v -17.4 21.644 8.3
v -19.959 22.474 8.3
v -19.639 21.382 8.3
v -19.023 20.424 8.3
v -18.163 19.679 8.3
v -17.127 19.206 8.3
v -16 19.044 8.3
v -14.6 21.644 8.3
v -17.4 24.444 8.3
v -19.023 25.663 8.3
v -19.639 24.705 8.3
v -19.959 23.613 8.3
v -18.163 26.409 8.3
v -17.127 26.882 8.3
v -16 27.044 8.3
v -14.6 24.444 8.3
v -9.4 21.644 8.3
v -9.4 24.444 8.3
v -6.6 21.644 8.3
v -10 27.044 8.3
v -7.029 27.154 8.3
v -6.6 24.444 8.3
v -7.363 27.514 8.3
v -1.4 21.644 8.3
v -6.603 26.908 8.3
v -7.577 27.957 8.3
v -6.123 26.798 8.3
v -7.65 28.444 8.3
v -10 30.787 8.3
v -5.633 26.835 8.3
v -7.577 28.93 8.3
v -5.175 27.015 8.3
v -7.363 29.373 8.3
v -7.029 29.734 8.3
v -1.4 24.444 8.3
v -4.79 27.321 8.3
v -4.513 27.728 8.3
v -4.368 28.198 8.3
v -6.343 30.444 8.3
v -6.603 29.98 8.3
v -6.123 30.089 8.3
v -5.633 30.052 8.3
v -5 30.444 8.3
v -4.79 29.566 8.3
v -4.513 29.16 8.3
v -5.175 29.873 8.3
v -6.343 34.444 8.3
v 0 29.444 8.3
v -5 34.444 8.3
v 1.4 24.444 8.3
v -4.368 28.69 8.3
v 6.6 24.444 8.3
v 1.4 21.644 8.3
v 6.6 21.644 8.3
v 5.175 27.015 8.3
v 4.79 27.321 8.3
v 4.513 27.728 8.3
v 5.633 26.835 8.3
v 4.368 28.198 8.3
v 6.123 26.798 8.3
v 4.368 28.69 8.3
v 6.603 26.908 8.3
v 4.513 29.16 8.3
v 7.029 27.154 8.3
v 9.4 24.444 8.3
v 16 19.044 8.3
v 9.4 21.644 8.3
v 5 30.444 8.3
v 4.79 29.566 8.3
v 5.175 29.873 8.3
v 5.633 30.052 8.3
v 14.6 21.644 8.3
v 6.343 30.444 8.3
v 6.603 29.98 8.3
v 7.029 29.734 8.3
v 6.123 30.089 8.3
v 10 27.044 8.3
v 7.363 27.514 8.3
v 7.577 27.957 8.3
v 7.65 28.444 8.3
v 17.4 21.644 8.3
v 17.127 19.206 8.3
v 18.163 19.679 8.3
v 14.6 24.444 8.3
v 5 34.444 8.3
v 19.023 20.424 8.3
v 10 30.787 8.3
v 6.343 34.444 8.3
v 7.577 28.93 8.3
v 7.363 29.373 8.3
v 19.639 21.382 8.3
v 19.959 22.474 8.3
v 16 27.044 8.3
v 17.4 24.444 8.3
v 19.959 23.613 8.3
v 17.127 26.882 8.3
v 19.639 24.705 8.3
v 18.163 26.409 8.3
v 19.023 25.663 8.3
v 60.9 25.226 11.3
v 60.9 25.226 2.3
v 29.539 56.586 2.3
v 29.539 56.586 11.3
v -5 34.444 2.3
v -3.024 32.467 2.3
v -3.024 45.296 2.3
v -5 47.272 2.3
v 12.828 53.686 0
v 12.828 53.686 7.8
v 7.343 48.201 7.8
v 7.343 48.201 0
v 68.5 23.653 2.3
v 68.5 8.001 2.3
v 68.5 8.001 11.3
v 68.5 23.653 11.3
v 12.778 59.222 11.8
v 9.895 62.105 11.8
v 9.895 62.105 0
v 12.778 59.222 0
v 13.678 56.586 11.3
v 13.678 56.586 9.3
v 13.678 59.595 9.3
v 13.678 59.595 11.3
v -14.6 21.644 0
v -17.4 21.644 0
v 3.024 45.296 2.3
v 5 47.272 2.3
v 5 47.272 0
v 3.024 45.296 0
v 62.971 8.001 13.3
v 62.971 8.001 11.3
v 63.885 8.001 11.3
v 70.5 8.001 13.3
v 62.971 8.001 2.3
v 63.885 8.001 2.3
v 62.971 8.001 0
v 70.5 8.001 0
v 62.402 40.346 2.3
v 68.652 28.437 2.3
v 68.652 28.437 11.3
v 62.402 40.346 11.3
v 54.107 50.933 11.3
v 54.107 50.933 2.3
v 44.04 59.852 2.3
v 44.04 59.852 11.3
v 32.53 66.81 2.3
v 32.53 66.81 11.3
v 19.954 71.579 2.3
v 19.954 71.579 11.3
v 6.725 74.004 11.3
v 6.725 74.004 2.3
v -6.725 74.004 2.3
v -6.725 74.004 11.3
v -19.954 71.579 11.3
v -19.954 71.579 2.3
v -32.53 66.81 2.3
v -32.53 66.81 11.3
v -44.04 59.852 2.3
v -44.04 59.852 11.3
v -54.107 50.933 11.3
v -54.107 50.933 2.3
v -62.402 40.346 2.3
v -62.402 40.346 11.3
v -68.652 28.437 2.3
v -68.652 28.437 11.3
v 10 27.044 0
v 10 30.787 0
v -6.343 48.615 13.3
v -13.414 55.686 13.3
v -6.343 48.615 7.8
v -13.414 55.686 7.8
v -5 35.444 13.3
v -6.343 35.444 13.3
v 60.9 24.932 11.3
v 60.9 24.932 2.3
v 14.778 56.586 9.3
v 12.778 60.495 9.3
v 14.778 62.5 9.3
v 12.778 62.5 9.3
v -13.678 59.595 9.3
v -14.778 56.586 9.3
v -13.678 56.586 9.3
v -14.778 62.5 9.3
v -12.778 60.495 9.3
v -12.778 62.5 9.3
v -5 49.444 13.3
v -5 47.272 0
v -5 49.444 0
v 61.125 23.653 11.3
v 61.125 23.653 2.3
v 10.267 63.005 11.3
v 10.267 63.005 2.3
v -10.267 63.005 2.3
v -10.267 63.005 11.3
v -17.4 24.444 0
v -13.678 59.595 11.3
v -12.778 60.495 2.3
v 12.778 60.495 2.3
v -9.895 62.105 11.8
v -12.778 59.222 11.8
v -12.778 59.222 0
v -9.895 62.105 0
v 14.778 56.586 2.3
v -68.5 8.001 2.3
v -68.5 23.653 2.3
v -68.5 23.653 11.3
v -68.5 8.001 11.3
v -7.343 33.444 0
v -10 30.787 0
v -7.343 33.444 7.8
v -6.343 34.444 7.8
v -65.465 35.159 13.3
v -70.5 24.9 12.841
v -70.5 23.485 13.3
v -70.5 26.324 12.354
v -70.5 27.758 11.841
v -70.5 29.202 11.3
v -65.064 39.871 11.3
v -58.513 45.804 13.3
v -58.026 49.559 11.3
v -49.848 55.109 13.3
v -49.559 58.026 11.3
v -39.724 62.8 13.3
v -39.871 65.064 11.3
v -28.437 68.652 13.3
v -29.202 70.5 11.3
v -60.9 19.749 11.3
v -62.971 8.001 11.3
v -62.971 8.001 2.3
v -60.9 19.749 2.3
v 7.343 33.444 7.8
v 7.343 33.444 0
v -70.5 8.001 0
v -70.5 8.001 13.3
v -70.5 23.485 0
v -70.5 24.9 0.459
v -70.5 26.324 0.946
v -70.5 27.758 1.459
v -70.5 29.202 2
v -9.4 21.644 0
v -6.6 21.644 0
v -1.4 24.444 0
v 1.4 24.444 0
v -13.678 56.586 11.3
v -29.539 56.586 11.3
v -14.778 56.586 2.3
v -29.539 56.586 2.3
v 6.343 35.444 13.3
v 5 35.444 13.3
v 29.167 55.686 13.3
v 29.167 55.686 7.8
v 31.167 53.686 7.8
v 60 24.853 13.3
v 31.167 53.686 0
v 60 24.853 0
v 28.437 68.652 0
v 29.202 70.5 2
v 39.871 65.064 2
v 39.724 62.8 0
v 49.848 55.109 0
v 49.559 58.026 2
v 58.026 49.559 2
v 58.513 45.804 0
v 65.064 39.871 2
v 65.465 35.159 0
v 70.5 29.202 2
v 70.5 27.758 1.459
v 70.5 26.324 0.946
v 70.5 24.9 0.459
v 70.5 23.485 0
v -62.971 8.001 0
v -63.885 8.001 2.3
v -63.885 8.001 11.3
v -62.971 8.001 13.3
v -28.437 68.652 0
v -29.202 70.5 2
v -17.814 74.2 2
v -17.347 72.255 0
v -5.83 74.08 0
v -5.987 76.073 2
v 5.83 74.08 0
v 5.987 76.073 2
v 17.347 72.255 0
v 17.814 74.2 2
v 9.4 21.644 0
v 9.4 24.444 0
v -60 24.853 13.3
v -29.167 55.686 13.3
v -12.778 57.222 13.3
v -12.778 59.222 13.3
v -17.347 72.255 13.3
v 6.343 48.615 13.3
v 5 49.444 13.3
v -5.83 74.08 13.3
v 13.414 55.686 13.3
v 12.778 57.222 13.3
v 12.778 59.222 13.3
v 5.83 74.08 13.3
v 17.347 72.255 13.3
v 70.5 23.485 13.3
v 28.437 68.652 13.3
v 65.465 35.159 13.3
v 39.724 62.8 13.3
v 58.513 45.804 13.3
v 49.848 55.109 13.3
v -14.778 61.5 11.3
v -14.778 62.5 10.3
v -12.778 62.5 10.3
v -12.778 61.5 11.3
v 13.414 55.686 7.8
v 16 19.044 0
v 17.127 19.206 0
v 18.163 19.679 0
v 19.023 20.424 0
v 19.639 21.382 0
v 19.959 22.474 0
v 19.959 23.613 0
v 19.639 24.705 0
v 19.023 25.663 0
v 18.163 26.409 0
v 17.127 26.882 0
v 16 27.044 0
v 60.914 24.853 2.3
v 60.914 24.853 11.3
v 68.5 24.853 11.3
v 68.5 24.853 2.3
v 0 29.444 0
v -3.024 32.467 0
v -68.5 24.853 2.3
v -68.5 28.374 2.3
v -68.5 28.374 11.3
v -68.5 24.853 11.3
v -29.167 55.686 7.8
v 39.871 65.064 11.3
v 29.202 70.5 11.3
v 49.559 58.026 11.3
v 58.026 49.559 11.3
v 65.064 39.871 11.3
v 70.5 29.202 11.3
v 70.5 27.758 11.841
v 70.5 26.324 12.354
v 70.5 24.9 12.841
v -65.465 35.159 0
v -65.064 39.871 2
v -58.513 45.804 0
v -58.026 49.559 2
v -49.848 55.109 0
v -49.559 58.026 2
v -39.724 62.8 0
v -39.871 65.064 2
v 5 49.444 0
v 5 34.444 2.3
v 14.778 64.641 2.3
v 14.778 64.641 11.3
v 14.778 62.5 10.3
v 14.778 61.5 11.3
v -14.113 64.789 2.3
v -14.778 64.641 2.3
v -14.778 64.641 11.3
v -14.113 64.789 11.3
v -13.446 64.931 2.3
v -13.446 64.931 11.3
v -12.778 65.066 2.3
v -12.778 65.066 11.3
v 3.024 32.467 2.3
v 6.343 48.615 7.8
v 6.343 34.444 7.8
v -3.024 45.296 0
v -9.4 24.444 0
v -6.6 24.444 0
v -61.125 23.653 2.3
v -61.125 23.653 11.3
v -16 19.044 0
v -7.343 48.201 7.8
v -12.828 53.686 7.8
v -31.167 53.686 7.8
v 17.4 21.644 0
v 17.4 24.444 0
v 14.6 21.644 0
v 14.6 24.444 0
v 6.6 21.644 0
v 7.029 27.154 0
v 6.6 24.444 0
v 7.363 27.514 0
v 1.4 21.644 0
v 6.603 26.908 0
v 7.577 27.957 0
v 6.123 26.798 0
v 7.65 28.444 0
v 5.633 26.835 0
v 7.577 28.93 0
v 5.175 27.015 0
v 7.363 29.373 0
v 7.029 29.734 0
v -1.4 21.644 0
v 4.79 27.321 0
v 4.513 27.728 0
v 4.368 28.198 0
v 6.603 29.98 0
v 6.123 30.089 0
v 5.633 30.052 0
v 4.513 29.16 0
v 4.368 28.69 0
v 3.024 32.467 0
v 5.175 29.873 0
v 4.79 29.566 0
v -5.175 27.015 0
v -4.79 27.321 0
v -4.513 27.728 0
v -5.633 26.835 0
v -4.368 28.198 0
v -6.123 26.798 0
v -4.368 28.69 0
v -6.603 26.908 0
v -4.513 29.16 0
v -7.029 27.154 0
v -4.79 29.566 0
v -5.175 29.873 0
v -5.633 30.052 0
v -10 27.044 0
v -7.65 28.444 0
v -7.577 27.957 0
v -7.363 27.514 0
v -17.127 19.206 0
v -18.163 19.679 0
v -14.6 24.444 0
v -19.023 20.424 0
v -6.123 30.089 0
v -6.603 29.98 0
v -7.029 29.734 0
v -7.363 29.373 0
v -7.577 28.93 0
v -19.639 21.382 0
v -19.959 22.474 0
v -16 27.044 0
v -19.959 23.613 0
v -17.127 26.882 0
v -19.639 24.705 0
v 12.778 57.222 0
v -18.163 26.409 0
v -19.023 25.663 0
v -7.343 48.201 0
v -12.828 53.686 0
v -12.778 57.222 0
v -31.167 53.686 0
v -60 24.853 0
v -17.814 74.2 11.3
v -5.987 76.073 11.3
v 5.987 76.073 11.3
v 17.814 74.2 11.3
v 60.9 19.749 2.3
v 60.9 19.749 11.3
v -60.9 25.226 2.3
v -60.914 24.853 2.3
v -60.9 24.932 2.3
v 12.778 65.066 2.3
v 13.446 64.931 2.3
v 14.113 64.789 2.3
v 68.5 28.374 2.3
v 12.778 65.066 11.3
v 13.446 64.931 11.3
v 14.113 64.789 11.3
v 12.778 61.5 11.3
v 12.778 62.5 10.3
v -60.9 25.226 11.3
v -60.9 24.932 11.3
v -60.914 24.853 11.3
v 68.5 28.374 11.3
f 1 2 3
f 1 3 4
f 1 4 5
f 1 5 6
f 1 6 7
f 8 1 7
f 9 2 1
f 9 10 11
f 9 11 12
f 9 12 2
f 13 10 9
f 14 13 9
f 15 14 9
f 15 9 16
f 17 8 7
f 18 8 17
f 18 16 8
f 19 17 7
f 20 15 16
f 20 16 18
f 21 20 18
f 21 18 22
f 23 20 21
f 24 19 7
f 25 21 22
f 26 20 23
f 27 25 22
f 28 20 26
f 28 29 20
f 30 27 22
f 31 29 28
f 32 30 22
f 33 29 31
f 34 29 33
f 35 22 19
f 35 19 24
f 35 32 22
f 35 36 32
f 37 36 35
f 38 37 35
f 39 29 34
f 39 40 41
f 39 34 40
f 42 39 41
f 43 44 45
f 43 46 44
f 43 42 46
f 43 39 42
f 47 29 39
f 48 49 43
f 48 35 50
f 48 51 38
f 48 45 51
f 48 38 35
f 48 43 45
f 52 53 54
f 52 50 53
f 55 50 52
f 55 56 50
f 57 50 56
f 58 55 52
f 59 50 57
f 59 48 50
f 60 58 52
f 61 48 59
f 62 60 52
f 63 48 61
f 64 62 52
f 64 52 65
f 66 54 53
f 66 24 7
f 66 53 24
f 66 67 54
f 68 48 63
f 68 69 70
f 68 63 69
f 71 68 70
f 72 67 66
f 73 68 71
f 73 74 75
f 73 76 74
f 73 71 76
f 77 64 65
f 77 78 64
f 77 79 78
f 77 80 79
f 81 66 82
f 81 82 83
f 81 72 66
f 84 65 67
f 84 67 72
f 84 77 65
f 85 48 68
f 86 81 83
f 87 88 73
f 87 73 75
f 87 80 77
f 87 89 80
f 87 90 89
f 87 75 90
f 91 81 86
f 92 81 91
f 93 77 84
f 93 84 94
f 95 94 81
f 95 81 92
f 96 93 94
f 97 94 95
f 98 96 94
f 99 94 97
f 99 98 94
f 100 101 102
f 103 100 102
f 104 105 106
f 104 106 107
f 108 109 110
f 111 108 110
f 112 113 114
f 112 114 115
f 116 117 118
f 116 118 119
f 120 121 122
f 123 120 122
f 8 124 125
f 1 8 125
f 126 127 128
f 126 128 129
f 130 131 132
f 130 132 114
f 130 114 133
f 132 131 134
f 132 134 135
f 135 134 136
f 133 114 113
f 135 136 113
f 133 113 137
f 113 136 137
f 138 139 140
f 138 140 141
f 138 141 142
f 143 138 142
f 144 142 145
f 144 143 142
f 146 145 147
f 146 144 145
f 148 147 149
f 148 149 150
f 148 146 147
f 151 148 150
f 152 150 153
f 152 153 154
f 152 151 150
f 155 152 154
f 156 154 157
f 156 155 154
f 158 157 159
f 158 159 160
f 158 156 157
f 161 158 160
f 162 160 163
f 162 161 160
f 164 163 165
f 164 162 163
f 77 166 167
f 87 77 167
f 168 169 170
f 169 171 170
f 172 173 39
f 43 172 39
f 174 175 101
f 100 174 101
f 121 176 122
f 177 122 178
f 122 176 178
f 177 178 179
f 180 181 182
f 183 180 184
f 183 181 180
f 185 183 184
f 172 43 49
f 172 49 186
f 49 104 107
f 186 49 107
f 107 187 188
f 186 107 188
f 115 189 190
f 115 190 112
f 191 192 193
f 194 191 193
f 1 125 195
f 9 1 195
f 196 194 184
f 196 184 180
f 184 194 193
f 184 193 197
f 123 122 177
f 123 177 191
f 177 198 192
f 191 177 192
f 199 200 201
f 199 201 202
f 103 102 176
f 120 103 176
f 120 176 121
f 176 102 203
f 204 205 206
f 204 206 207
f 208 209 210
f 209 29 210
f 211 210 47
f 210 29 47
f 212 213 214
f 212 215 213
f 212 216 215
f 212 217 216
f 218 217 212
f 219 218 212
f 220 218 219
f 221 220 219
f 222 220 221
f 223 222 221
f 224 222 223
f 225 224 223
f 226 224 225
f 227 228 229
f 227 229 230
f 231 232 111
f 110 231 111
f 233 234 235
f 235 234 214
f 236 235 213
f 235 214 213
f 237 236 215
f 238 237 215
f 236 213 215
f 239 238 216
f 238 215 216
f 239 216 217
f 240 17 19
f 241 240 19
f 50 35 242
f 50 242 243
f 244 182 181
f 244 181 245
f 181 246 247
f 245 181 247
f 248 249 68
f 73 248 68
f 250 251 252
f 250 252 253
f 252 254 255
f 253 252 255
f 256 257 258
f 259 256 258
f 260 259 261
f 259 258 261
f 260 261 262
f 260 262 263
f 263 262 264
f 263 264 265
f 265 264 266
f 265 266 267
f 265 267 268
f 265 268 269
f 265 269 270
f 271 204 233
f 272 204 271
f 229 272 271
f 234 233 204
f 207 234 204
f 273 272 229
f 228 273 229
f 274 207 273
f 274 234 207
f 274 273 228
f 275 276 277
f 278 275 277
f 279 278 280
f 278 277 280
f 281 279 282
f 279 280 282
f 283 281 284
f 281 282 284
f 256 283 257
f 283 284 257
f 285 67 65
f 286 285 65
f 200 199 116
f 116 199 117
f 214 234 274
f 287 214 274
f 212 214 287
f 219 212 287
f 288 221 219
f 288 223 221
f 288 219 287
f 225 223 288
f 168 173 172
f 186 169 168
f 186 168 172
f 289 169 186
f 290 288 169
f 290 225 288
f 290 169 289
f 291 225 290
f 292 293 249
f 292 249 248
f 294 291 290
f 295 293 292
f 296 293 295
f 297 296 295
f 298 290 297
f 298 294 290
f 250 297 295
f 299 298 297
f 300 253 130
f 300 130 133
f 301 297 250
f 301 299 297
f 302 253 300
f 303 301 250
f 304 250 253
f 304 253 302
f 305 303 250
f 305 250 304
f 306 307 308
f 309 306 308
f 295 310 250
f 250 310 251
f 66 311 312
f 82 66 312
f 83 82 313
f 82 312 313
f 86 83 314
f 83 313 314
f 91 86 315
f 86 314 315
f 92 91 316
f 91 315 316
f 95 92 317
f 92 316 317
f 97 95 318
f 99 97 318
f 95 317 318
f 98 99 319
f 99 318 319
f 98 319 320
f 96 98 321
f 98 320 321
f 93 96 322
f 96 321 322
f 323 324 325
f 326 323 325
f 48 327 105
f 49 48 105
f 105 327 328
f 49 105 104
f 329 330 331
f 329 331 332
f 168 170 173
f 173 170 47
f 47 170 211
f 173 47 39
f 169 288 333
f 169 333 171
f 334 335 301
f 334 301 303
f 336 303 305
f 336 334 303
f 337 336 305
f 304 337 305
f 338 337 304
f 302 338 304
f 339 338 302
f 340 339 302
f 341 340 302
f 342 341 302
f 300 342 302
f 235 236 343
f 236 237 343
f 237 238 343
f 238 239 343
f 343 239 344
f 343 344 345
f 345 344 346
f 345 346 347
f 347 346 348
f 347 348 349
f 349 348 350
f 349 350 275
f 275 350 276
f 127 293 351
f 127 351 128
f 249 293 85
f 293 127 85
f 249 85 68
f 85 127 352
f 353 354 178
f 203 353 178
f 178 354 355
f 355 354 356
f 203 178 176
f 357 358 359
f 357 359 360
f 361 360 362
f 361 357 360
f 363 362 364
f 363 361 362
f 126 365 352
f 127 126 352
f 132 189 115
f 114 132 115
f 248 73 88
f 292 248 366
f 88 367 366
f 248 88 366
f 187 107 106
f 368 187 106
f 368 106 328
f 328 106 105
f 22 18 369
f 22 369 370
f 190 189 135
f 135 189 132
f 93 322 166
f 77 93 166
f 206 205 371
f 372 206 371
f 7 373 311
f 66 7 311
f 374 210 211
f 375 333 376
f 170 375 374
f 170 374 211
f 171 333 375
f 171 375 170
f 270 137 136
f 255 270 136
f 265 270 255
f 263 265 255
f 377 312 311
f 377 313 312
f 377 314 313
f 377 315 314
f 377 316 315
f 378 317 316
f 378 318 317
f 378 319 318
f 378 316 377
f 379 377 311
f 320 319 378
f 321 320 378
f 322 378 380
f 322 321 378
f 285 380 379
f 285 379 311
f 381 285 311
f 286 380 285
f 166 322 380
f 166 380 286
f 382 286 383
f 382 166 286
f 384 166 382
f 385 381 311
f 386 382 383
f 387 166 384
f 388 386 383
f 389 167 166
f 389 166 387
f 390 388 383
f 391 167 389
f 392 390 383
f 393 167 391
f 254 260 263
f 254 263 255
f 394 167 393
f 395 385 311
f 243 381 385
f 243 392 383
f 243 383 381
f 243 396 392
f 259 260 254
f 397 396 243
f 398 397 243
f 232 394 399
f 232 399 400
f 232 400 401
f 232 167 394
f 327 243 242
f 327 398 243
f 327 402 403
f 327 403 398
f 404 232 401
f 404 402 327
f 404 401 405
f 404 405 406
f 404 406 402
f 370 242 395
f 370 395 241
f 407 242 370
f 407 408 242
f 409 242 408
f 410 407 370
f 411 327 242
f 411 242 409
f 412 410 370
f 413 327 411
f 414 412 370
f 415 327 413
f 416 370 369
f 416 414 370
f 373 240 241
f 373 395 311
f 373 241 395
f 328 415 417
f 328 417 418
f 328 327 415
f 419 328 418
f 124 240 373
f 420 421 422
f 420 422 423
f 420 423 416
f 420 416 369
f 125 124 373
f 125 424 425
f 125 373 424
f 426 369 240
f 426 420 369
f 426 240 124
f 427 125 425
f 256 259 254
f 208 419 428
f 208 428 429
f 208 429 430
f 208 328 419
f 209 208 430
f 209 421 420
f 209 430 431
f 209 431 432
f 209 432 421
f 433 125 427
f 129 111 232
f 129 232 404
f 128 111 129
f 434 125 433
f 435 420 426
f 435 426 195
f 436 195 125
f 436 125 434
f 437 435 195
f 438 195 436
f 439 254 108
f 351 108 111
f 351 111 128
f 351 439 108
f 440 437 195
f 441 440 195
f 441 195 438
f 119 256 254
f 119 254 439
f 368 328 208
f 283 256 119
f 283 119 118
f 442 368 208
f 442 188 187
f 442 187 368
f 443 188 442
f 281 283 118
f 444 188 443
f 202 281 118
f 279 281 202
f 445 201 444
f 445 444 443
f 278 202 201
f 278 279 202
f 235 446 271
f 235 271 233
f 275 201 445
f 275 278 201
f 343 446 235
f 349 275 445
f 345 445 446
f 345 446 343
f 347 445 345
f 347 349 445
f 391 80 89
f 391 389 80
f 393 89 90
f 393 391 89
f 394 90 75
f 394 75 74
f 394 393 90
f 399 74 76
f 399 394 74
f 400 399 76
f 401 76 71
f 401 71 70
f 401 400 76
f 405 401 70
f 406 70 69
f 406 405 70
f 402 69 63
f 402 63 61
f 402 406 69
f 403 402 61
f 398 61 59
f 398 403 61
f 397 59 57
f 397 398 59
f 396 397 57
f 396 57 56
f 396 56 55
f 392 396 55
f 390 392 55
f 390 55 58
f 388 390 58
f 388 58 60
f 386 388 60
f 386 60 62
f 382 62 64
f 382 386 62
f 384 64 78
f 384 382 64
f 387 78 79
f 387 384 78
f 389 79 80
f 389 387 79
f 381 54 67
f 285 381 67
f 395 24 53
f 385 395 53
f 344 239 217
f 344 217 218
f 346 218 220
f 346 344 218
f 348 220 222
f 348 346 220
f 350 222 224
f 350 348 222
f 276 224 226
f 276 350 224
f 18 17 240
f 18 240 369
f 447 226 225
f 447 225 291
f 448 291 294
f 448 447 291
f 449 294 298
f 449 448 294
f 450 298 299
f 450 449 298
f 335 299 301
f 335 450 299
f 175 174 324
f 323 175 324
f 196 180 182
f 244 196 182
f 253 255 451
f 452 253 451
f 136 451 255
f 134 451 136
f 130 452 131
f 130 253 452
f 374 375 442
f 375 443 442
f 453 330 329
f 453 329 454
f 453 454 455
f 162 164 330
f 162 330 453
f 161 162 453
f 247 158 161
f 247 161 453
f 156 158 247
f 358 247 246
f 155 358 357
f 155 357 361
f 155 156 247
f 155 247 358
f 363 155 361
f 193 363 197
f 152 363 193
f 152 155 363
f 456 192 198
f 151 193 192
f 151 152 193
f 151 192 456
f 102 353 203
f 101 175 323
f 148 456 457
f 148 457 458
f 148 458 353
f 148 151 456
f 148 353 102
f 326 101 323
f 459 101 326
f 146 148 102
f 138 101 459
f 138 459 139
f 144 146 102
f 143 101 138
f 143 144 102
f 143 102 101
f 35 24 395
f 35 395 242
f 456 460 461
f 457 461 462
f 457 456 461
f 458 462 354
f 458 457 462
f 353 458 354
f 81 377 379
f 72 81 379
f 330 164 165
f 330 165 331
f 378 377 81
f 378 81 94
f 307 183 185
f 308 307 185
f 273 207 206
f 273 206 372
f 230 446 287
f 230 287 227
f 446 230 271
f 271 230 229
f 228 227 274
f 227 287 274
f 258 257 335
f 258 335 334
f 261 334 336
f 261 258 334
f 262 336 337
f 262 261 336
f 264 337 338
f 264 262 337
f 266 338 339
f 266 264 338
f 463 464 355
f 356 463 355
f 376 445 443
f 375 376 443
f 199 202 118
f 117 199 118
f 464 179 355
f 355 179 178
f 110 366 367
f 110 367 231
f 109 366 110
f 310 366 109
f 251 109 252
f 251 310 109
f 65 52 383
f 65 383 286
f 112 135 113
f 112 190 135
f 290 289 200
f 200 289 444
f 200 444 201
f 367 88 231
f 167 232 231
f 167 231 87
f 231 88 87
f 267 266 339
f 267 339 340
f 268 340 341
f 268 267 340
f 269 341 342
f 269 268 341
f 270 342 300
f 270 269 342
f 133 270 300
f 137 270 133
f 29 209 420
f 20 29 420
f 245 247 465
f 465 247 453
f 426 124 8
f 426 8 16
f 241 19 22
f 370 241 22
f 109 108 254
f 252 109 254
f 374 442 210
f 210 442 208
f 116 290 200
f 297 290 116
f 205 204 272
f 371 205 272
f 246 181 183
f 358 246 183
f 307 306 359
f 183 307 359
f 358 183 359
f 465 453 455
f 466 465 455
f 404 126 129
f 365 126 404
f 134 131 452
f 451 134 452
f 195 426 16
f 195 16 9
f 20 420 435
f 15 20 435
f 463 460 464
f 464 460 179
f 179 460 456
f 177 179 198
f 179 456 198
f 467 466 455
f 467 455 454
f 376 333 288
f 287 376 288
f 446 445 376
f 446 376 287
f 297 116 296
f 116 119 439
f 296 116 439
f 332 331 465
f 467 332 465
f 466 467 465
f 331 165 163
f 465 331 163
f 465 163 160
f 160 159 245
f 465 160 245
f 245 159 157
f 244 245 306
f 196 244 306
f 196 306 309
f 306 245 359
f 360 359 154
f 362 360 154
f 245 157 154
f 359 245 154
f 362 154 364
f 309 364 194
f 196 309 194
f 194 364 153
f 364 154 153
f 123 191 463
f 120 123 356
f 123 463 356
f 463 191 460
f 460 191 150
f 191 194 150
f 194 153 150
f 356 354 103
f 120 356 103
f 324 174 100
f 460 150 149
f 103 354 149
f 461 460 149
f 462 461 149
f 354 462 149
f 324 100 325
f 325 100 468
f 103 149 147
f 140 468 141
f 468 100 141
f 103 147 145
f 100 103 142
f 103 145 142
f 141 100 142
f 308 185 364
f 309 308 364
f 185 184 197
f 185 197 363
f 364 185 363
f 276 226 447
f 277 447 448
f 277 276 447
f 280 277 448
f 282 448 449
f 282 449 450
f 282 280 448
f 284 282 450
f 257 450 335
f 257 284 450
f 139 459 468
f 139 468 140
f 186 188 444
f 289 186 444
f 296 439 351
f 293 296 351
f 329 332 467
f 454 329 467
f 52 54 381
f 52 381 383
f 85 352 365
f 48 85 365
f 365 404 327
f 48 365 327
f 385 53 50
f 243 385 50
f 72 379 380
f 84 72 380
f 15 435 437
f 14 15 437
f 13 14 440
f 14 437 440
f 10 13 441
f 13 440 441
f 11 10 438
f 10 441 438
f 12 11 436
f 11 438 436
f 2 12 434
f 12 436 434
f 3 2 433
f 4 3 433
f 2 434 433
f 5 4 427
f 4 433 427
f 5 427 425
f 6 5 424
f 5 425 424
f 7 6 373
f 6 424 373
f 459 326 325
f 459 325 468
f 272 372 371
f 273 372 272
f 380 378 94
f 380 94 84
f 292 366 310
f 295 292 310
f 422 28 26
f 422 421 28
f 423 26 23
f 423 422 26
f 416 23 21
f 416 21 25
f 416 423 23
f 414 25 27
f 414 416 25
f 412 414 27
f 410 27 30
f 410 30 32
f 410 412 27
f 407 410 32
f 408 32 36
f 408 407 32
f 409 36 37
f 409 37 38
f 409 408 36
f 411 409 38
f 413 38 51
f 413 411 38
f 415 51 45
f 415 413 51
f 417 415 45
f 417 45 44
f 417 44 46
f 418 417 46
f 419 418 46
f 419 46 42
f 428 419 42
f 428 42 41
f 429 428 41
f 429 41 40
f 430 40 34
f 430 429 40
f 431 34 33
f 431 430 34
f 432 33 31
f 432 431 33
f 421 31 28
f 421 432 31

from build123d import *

# Parameters (mm, degrees)
ESBO_O4_R                 = 1.65
RESSALTO_EXTRUS_O1_DEPTH  = 2.3
RESSALTO_EXTRUS_O2_DEPTH  = 3.5
RESSALTO_EXTRUS_O3_DEPTH  = 11
CORTE_EXTRUS_O1_DEPTH     = 10.5
CORTE_EXTRUS_O2_DEPTH     = 40.5
RESSALTO_EXTRUS_O4_DEPTH  = 2
CHANFRO1_SIZE             = 1
ESBO_O11_R                = 1.65
RESSALTO_EXTRUS_O5_DEPTH  = 6
RESSALTO_EXTRUS_O6_DEPTH  = 7
CORTE_EXTRUS_O3_DEPTH     = 94.096670187
RESSALTO_EXTRUS_O7_DEPTH  = 2.3
ESBO_O16_W                = 2.8
ESBO_O16_H                = 2.8
RESSALTO_EXTRUS_O8_DEPTH  = 8.3
ESBO_O17_W                = 2.8
ESBO_O17_H                = 2.8
CORTE_EXTRUS_O4_DEPTH     = 94.002096751
CORTE_EXTRUS_O5_DEPTH     = 11
RESSALTO_EXTRUS_O9_DEPTH  = 2.3
RESSALTO_EXTRUS_O10_DEPTH = 11
RESSALTO_EXTRUS_O11_DEPTH = 2
RESSALTO_EXTRUS_O12_DEPTH = 9
RESSALTO_EXTRUS_O13_DEPTH = 5
CORTE_EXTRUS_O6_REACH     = 107.129
ESBO_O26_W                = 10.5
ESBO_O26_H                = 1.2
RESSALTO_EXTRUS_O14_DEPTH = 11
CORTE_EXTRUS_O7_DEPTH     = 101.585237485
RESSALTO_EXTRUS_O15_DEPTH = 11
RESSALTO_EXTRUS_O16_DEPTH = 13.3
CORTE_EXTRUS_O8_START     = -11
CORTE_EXTRUS_O8_DEPTH     = 11
RESSALTO_EXTRUS_O17_START = -2
RESSALTO_EXTRUS_O17_DEPTH = 2
CHANFRO2_SIZE             = 2
CHANFRO3_SIZE             = 2
RESSALTO_EXTRUS_O18_DEPTH = 2.3
RESSALTO_EXTRUS_O19_DEPTH = 3.5
RESSALTO_EXTRUS_O20_DEPTH = 2
RESSALTO_EXTRUS_O23_DEPTH = 1.5


with BuildPart() as part:
    # Esboço4 → Ressalto-extrusão1 (new body)
    with BuildSketch(Plane.XY):
        Polygon((70, 0), (70, 28.994949366), (28.994949366, 70), (-28.994949366, 70), (-70, 28.994949366), (-70, 0), (-60, 0), (-60, 24.852813742), (-42.426406871, 42.426406871), (-31.166522241, 53.686291501), (-14.242640687, 53.686291501), (-10, 49.443650814), (-10, 24.443650814), (10, 24.443650814), (10, 49.443650814), (14.242640687, 53.686291501), (31.166522241, 53.686291501), (42.426406871, 42.426406871), (60, 24.852813742), (60, 0), align=None)
        with Locations((6, 28.443650814)):
            Circle(ESBO_O4_R, mode=Mode.SUBTRACT)
        with Locations(Location((-6, 28.443650814, 0), (0, 0, 180))):
            Circle(ESBO_O4_R, mode=Mode.SUBTRACT)
        Polygon((-9.894556364, 62.105443636), (9.894556364, 62.105443636), (12.778174593, 59.221825407), (12.778174593, 57.221825407), (5, 49.443650814), (5, 34.443650814), (0, 29.443650814), (-5, 34.443650814), (-5, 49.443650814), (-12.778174593, 57.221825407), (-12.778174593, 59.221825407), align=None, mode=Mode.SUBTRACT)
    extrude(amount=RESSALTO_EXTRUS_O1_DEPTH)

    # Esboço6 → Ressalto-extrusão2 (add)
    with BuildSketch(Plane.XY.offset(2.3)):
        Polygon((-10, 49.443650814), (-14.242640687, 53.686291501), (-31.166522241, 53.686291501), (-35.409162928, 49.443650814), (-36.823376491, 50.857864376), (-31.994949366, 55.686291501), (-31.166522241, 55.686291501), (-13.414213562, 55.686291501), (-8.585786438, 50.857864376), align=None)
        Polygon((8.585786438, 50.857864376), (13.414213562, 55.686291501), (31.166522241, 55.686291501), (31.994949366, 55.686291501), (36.823376491, 50.857864376), (35.409162928, 49.443650814), (31.166522241, 53.686291501), (14.242640687, 53.686291501), (10, 49.443650814), align=None)
    extrude(amount=RESSALTO_EXTRUS_O2_DEPTH)

    # Esboço7 → Ressalto-extrusão3 (add)
    with BuildSketch(Plane.XY.offset(2.3)):
        Polygon((27.130988335, 65.5), (-27.130988335, 65.5), (-65.5, 27.130988335), (-65.5, 0), (-62.5, 0), (-62.5, 25.888347648), (-25.888347648, 62.5), (25.888347648, 62.5), (62.5, 25.888347648), (62.5, 0), (65.5, 0), (65.5, 27.130988335), align=None)
    extrude(amount=RESSALTO_EXTRUS_O3_DEPTH)

    # Esboço8 → Corte-extrusão1 (cut)
    with BuildSketch(Plane.XY.offset(2.3)):
        Polygon((-65.5, 0), (-65.5, 27.130988335), (-27.130988335, 65.5), (27.130988335, 65.5), (65.5, 27.130988335), (65.5, 0), (65.5, -7.47317723), (91.763905533, -7.47317723), (91.763905533, 81.084833901), (-91.763905533, 81.084833901), (-91.763905533, -7.47317723), (-65.5, -7.47317723), align=None)
    extrude(amount=-CORTE_EXTRUS_O1_DEPTH, mode=Mode.SUBTRACT)

    # Esboço9 → Corte-extrusão2 (cut)
    with BuildSketch(Plane(origin=(0, 0, 0), x_dir=(-1, 0, 0), z_dir=(0, 0, -1))):
        Polygon((60, 0), (70, 0), (70, 8.000623443), (-93.298268705, 8.000623443), (-93.298268705, 0), align=None)
    extrude(amount=-CORTE_EXTRUS_O2_DEPTH, mode=Mode.SUBTRACT)

    # Esboço10 → Ressalto-extrusão4 (add)
    with BuildSketch(Plane.XY.offset(13.3)):
        Polygon((-62.5, 8.000623443), (-62.5, 25.888347648), (-25.888347648, 62.5), (25.888347648, 62.5), (62.5, 25.888347648), (62.5, 8.000623443), (60, 8.000623443), (60, 24.852813742), (24.852813742, 60), (-24.852813742, 60), (-60, 24.852813742), (-60, 8.000623443), align=None)
    extrude(amount=-RESSALTO_EXTRUS_O4_DEPTH)

    # Chanfro1
    chanfro1_edges = [part.edges().sort_by_distance(p)[0] for p in [
        (-62.5, 16.944485546, 11.3),
        (-44.194173824, 44.194173824, 11.3),
        (0, 62.5, 11.3),
        (44.194173824, 44.194173824, 11.3),
        (62.5, 16.944485546, 11.3),
    ]]
    chamfer(chanfro1_edges, length=CHANFRO1_SIZE)

    # Esboço11 → Ressalto-extrusão5 (add)
    with BuildSketch(Plane.XY.offset(2.3)):
        Polygon((-10, 24.443650814), (10, 24.443650814), (10, 34.443650814), (5, 34.443650814), (0, 29.443650814), (-5, 34.443650814), (-10, 34.443650814), align=None)
        with Locations(Location((-6, 28.443650814, 0), (0, 0, 180))):
            Circle(ESBO_O11_R, mode=Mode.SUBTRACT)
        with Locations((6, 28.443650814)):
            Circle(ESBO_O11_R, mode=Mode.SUBTRACT)
    extrude(amount=RESSALTO_EXTRUS_O5_DEPTH)

    # Esboço12 → Ressalto-extrusão6 (add)
    with BuildSketch(Plane.XY.offset(2.3)):
        Polygon((-5, 34.443650814), (-5, 49.443650814), (-12.778174593, 57.221825407), (-12.778174593, 62.936367936), (-14.778174593, 62.936367936), (-14.778174593, 55.686291501), (-13.414213562, 55.686291501), (-6.343145751, 48.615223689), (-6.343145751, 34.443650814), align=None)
        Polygon((6.343145751, 34.443650814), (5, 34.443650814), (5, 49.443650814), (12.778174593, 57.221825407), (12.778174593, 62.936367936), (14.778174593, 62.936367936), (14.778174593, 55.686291501), (13.414213562, 55.686291501), (6.343145751, 48.615223689), align=None)
    extrude(amount=RESSALTO_EXTRUS_O6_DEPTH)

    # Esboço14 → Corte-extrusão3 (cut, through all)
    with BuildSketch(Plane.XY.offset(9.3)):
        Polygon((14.242640687, 53.686291501), (12.828427125, 53.686291501), (6.343145751, 47.201010127), (6.343145751, 34.443650814), (18.19110406, 22.595692505), align=None)
        Polygon((-14.242640687, 53.686291501), (-18.19110406, 22.595692505), (-6.343145751, 34.443650814), (-6.343145751, 47.201010127), (-12.828427125, 53.686291501), align=None)
    extrude(amount=-CORTE_EXTRUS_O3_DEPTH, mode=Mode.SUBTRACT)

    # Esboço15 → Ressalto-extrusão7 (add)
    with BuildSketch(Plane.XY.offset(2.3)):
        Polygon((-5, 47.272077939), (-3.023616976, 45.295694915), (-3.023616976, 32.46726779), (-5, 34.443650814), align=None)
        Polygon((5, 34.443650814), (5, 47.272077939), (3.023616976, 45.295694915), (3.023616976, 32.46726779), align=None)
    extrude(amount=-RESSALTO_EXTRUS_O7_DEPTH)

    # Esboço16 → Ressalto-extrusão8 (add)
    with BuildSketch(Plane(origin=(0, 0, 0), x_dir=(-1, 0, 0), z_dir=(0, 0, -1))):
        with BuildLine():
            Line((-16, 27.043650814), (-10, 27.043650814))
            Line((-10, 27.043650814), (-10, 24.443650814))
            Line((-10, 24.443650814), (10, 24.443650814))
            Line((10, 24.443650814), (10, 27.043650814))
            Line((10, 27.043650814), (16, 27.043650814))
            ThreePointArc((16, 27.043650814), (20, 23.043650814), (16, 19.043650814))
            Line((16, 19.043650814), (-16, 19.043650814))
            ThreePointArc((-16, 19.043650814), (-20, 23.043650814), (-16, 27.043650814))
        make_face()
        with Locations((-16, 23.043650814)):
            Rectangle(ESBO_O16_W, ESBO_O16_H, mode=Mode.SUBTRACT)
        with Locations((16, 23.043650814)):
            Rectangle(ESBO_O16_W, ESBO_O16_H, mode=Mode.SUBTRACT)
    extrude(amount=-RESSALTO_EXTRUS_O8_DEPTH)

    # Esboço17 → Corte-extrusão4 (cut, through all)
    with BuildSketch(Plane.XY.offset(8.3)):
        with Locations((0, 23.043650814)):
            Rectangle(ESBO_O17_W, ESBO_O17_H)
        with Locations((-8, 23.043650814)):
            Rectangle(ESBO_O17_W, ESBO_O17_H)
        with Locations((8, 23.043650814)):
            Rectangle(ESBO_O17_W, ESBO_O17_H)
    extrude(amount=-CORTE_EXTRUS_O4_DEPTH, mode=Mode.SUBTRACT)

    # Esboço18 → Corte-extrusão5 (cut)
    with BuildSketch(Plane.XY.offset(13.3)):
        Polygon((14.778174593, 60), (24.852813742, 60), (60, 24.852813742), (60, 8.000623443), (65.5, 8.000623443), (65.5, 27.130988335), (27.130988335, 65.5), (14.778174593, 65.5), (14.778174593, 62.5), align=None)
        Polygon((-27.130988335, 65.5), (-65.5, 27.130988335), (-65.5, 8.000623443), (-60, 8.000623443), (-60, 24.852813742), (-24.852813742, 60), (-14.778174593, 60), (-14.778174593, 62.5), (-14.778174593, 65.5), align=None)
        Polygon((12.778174593, 65.5), (-12.778174593, 65.5), (-12.778174593, 62.5), (-12.778174593, 60), (12.778174593, 60), (12.778174593, 62.5), align=None)
    extrude(amount=-CORTE_EXTRUS_O5_DEPTH, mode=Mode.SUBTRACT)

    # Esboço19 → Ressalto-extrusão9 (add)
    with BuildSketch(Plane(origin=(0, 0, 0), x_dir=(-1, 0, 0), z_dir=(0, 0, -1))):
        Polygon((-65.5, 27.130988335), (-65.5, 8.000623443), (-70.5, 8.000623443), (-70.5, 29.202056147), (-29.202056147, 70.5), (29.202056147, 70.5), (70.5, 29.202056147), (70.5, 8.000623443), (65.5, 8.000623443), (65.5, 27.130988335), (27.130988335, 65.5), (-27.130988335, 65.5), align=None)
    extrude(amount=-RESSALTO_EXTRUS_O9_DEPTH)

    # Esboço20 → Ressalto-extrusão10 (add)
    with BuildSketch(Plane.XY.offset(2.3)):
        Polygon((-70.5, 8.000623443), (-70.5, 29.202056147), (-29.202056147, 70.5), (29.202056147, 70.5), (70.5, 29.202056147), (70.5, 8.000623443), (68.5, 8.000623443), (68.5, 28.373629023), (28.373629023, 68.5), (-28.373629023, 68.5), (-68.5, 28.373629023), (-68.5, 8.000623443), align=None)
    extrude(amount=RESSALTO_EXTRUS_O10_DEPTH)

    # Esboço21 → Ressalto-extrusão11 (add)
    with BuildSketch(Plane.XY.offset(13.3)):
        Polygon((-14.778174593, 55.686291501), (-12.778174593, 55.686291501), (-12.778174593, 59.221825407), (-9.894556364, 62.105443636), (9.894556364, 62.105443636), (12.778174593, 59.221825407), (12.778174593, 55.686291501), (14.778174593, 55.686291501), (29.166522241, 55.686291501), (31.166522241, 53.686291501), (60, 24.852813742), (60, 8.000623443), (68.5, 8.000623443), (68.5, 28.373629023), (28.373629023, 68.5), (-28.373629023, 68.5), (-68.5, 28.373629023), (-68.5, 8.000623443), (-60, 8.000623443), (-60, 24.852813742), (-31.166522241, 53.686291501), (-29.166522241, 55.686291501), align=None)
    extrude(amount=-RESSALTO_EXTRUS_O11_DEPTH)

    # Esboço22 → Ressalto-extrusão12 (add)
    with BuildSketch(Plane.XY.offset(2.3)):
        Polygon((60, 24.852813742), (60, 8.000623443), (60.9, 8.000623443), (60.9, 25.225605949), (29.539314447, 56.586291501), (13.678174593, 56.586291501), (13.678174593, 59.594617613), (10.26734857, 63.005443636), (-10.26734857, 63.005443636), (-13.678174593, 59.594617613), (-13.678174593, 56.586291501), (-29.539314447, 56.586291501), (-60.9, 25.225605949), (-60.9, 8.000623443), (-60, 8.000623443), (-60, 24.852813742), (-29.166522241, 55.686291501), (-12.778174593, 55.686291501), (-12.778174593, 59.221825407), (-9.894556364, 62.105443636), (9.894556364, 62.105443636), (12.778174593, 59.221825407), (12.778174593, 55.686291501), (29.166522241, 55.686291501), align=None)
    extrude(amount=RESSALTO_EXTRUS_O12_DEPTH)

    # Esboço24 → Ressalto-extrusão13 (add)
    with BuildSketch(Plane.XY.offset(8.3)):
        Polygon((-12.778174593, 57.221825407), (-12.778174593, 55.686291501), (-13.414213562, 55.686291501), (-6.343145751, 48.615223689), (-6.343145751, 34.443650814), (-6.343145751, 30.443650814), (-5, 30.443650814), (-5, 34.443650814), (-5, 49.443650814), align=None)
        Polygon((12.778174593, 55.686291501), (12.778174593, 57.221825407), (5, 49.443650814), (5, 34.443650814), (5, 30.443650814), (6.343145751, 30.443650814), (6.343145751, 34.443650814), (6.343145751, 48.615223689), (13.414213562, 55.686291501), align=None)
    extrude(amount=RESSALTO_EXTRUS_O13_DEPTH)

    # Corte-extrusão6: up to this face of the body (flat: up to its plane)
    corte_extrus_o6_end = Plane(part.part.faces().sort_by_distance((6.343145751, 40.542913033, 7.141595678))[0])
    # Esboço25 → Corte-extrusão6 (cut, up to the picked face)
    with BuildSketch(Plane.ZY.offset(6.343145751), mode=Mode.PRIVATE) as corte_extrus_o6_sk1:
        Polygon((8.3, 30.443650814), (13.3, 30.443650814), (13.3, 35.443650814), align=None)
    corte_extrus_o6_tool1 = split(extrude(corte_extrus_o6_sk1.sketch, amount=-CORTE_EXTRUS_O6_REACH, mode=Mode.PRIVATE), bisect_by=corte_extrus_o6_end, keep=Keep.BOTH, mode=Mode.PRIVATE)
    add(corte_extrus_o6_tool1.solids().sort_by(Axis((-6.343146, 32.110317, 11.633333), (1, 0, 0)))[0], mode=Mode.SUBTRACT)

    # Esboço26 → Ressalto-extrusão14 (add)
    with BuildSketch(Plane.XY.offset(13.3)):
        with Locations((-65.25, 24.252813742)):
            Rectangle(ESBO_O26_W, ESBO_O26_H)
        with Locations((65.25, 24.252813742)):
            Rectangle(ESBO_O26_W, ESBO_O26_H)
    extrude(amount=-RESSALTO_EXTRUS_O14_DEPTH)

    # Esboço27 → Corte-extrusão7 (cut, through all)
    with BuildSketch(Plane.XY.offset(13.3)):
        Polygon((-60, 24.852813742), (-65.050320566, -3.788977466), (-60, -3.788977466), align=None)
        Polygon((60, -3.788977466), (60, 24.852813742), (65.050320566, -3.788977466), align=None)
    extrude(amount=-CORTE_EXTRUS_O7_DEPTH, mode=Mode.SUBTRACT)

    # Esboço28 → Ressalto-extrusão15 (add)
    with BuildSketch(Plane.XY.offset(13.3)):
        Polygon((-60, 24.852813742), (-60.886326978, 25.009097102), (-63.885379784, 8.000623443), (-62.971495834, 8.000623443), align=None)
        Polygon((62.971495834, 8.000623443), (60, 24.852813742), (60.886326978, 25.009097102), (63.885379784, 8.000623443), align=None)
    extrude(amount=-RESSALTO_EXTRUS_O15_DEPTH)

    # Esboço29 → Ressalto-extrusão16 (add)
    with BuildSketch(Plane(origin=(0, 0, 0), x_dir=(-1, 0, 0), z_dir=(0, 0, -1))):
        with BuildLine():
            ThreePointArc((70.5, 29.202056147), (53.958363963, 53.958363963), (29.202056147, 70.5))
            Line((29.202056147, 70.5), (70.5, 29.202056147))
        make_face()
        with BuildLine():
            ThreePointArc((29.202056147, 70.5), (0, 76.308650121), (-29.202056147, 70.5))
            Line((-29.202056147, 70.5), (29.202056147, 70.5))
        make_face()
        with BuildLine():
            Line((-70.5, 29.202056147), (-29.202056147, 70.5))
            ThreePointArc((-29.202056147, 70.5), (-53.958363963, 53.958363963), (-70.5, 29.202056147))
        make_face()
    extrude(amount=-RESSALTO_EXTRUS_O16_DEPTH)

    # Esboço31 → Corte-extrusão8 (cut)
    with BuildSketch(Plane.XY.offset(13.3).offset(CORTE_EXTRUS_O8_START)):
        with BuildLine():
            Line((-68.652240935, 28.436689283), (-61.261204675, 25.375221824))
            ThreePointArc((-61.261204675, 25.375221824), (0, 66.308650121), (61.261204675, 25.375221824))
            Line((61.261204675, 25.375221824), (68.652240935, 28.436689283))
            ThreePointArc((68.652240935, 28.436689283), (0, 74.308650121), (-68.652240935, 28.436689283))
        make_face()
    extrude(amount=CORTE_EXTRUS_O8_DEPTH, mode=Mode.SUBTRACT)

    # Esboço32 → Ressalto-extrusão17 (add)
    with BuildSketch(Plane.XY.offset(13.3).offset(RESSALTO_EXTRUS_O17_START)):
        with BuildLine():
            Line((-68.652240935, 28.436689283), (-61.261204675, 25.375221824))
            ThreePointArc((-61.261204675, 25.375221824), (0, 66.308650121), (61.261204675, 25.375221824))
            Line((61.261204675, 25.375221824), (68.652240935, 28.436689283))
            ThreePointArc((68.652240935, 28.436689283), (0, 74.308650121), (-68.652240935, 28.436689283))
        make_face()
    extrude(amount=RESSALTO_EXTRUS_O17_DEPTH)

    # Chanfro2
    chanfro2_edges = [part.edges().sort_by_distance(p)[0] for p in [
        (0, 76.308650121, 13.3),
    ]]
    chamfer(chanfro2_edges, length=CHANFRO2_SIZE)

    # Chanfro3
    chanfro3_edges = [part.edges().sort_by_distance(p)[0] for p in [
        (0, 76.308650121, 0),
    ]]
    chamfer(chanfro3_edges, length=CHANFRO3_SIZE)

    # Esboço33 → Ressalto-extrusão18 (add)
    with BuildSketch(Plane(origin=(0, 0, 0), x_dir=(-1, 0, 0), z_dir=(0, 0, -1))):
        Polygon((6.343145751, 34.443650814), (6.343145751, 32.443650814), (7.343145751, 32.443650814), (7.343145751, 49.95835255), (6.343145751, 49.95835255), align=None)
        Polygon((-6.343145751, 49.95835255), (-6.343145751, 34.443650814), (-6.343145751, 32.443650814), (-7.343145751, 32.443650814), (-7.343145751, 49.95835255), align=None)
    extrude(amount=-RESSALTO_EXTRUS_O18_DEPTH)

    # Esboço34 → Ressalto-extrusão19 (add)
    with BuildSketch(Plane.XY.offset(2.3)):
        Polygon((-9.292893219, 50.150757595), (-7.343145751, 48.201010127), (-7.343145751, 33.443650814), (-6.343145751, 34.443650814), (-6.343145751, 48.615223689), (-8.585786438, 50.857864376), align=None)
        Polygon((9.292893219, 50.150757595), (8.585786438, 50.857864376), (6.343145751, 48.615223689), (6.343145751, 34.443650814), (7.343145751, 33.443650814), (7.343145751, 48.201010127), align=None)
    extrude(amount=RESSALTO_EXTRUS_O19_DEPTH)

    # Esboço35 → Ressalto-extrusão20 (add)
    with BuildSketch(Plane.XY.offset(5.8)):
        Polygon((-29.166522241, 55.686291501), (-31.166522241, 53.686291501), (-12.828427125, 53.686291501), (-7.343145751, 48.201010127), (-7.343145751, 33.443650814), (-6.343145751, 34.443650814), (-6.343145751, 48.615223689), (-13.414213562, 55.686291501), align=None)
        Polygon((12.828427125, 53.686291501), (31.166522241, 53.686291501), (29.166522241, 55.686291501), (13.414213562, 55.686291501), (6.343145751, 48.615223689), (6.343145751, 34.443650814), (7.343145751, 33.443650814), (7.343145751, 48.201010127), align=None)
    extrude(amount=RESSALTO_EXTRUS_O20_DEPTH)

    # Esboço39 → Ressalto-extrusão23 (add)
    with BuildSketch(Plane.XY.offset(13.3)):
        Polygon((-12.778174593, 59.221825407), (12.778174593, 59.221825407), (9.894556364, 62.105443636), (-9.894556364, 62.105443636), align=None)
    extrude(amount=-RESSALTO_EXTRUS_O23_DEPTH)


solid = part.part
